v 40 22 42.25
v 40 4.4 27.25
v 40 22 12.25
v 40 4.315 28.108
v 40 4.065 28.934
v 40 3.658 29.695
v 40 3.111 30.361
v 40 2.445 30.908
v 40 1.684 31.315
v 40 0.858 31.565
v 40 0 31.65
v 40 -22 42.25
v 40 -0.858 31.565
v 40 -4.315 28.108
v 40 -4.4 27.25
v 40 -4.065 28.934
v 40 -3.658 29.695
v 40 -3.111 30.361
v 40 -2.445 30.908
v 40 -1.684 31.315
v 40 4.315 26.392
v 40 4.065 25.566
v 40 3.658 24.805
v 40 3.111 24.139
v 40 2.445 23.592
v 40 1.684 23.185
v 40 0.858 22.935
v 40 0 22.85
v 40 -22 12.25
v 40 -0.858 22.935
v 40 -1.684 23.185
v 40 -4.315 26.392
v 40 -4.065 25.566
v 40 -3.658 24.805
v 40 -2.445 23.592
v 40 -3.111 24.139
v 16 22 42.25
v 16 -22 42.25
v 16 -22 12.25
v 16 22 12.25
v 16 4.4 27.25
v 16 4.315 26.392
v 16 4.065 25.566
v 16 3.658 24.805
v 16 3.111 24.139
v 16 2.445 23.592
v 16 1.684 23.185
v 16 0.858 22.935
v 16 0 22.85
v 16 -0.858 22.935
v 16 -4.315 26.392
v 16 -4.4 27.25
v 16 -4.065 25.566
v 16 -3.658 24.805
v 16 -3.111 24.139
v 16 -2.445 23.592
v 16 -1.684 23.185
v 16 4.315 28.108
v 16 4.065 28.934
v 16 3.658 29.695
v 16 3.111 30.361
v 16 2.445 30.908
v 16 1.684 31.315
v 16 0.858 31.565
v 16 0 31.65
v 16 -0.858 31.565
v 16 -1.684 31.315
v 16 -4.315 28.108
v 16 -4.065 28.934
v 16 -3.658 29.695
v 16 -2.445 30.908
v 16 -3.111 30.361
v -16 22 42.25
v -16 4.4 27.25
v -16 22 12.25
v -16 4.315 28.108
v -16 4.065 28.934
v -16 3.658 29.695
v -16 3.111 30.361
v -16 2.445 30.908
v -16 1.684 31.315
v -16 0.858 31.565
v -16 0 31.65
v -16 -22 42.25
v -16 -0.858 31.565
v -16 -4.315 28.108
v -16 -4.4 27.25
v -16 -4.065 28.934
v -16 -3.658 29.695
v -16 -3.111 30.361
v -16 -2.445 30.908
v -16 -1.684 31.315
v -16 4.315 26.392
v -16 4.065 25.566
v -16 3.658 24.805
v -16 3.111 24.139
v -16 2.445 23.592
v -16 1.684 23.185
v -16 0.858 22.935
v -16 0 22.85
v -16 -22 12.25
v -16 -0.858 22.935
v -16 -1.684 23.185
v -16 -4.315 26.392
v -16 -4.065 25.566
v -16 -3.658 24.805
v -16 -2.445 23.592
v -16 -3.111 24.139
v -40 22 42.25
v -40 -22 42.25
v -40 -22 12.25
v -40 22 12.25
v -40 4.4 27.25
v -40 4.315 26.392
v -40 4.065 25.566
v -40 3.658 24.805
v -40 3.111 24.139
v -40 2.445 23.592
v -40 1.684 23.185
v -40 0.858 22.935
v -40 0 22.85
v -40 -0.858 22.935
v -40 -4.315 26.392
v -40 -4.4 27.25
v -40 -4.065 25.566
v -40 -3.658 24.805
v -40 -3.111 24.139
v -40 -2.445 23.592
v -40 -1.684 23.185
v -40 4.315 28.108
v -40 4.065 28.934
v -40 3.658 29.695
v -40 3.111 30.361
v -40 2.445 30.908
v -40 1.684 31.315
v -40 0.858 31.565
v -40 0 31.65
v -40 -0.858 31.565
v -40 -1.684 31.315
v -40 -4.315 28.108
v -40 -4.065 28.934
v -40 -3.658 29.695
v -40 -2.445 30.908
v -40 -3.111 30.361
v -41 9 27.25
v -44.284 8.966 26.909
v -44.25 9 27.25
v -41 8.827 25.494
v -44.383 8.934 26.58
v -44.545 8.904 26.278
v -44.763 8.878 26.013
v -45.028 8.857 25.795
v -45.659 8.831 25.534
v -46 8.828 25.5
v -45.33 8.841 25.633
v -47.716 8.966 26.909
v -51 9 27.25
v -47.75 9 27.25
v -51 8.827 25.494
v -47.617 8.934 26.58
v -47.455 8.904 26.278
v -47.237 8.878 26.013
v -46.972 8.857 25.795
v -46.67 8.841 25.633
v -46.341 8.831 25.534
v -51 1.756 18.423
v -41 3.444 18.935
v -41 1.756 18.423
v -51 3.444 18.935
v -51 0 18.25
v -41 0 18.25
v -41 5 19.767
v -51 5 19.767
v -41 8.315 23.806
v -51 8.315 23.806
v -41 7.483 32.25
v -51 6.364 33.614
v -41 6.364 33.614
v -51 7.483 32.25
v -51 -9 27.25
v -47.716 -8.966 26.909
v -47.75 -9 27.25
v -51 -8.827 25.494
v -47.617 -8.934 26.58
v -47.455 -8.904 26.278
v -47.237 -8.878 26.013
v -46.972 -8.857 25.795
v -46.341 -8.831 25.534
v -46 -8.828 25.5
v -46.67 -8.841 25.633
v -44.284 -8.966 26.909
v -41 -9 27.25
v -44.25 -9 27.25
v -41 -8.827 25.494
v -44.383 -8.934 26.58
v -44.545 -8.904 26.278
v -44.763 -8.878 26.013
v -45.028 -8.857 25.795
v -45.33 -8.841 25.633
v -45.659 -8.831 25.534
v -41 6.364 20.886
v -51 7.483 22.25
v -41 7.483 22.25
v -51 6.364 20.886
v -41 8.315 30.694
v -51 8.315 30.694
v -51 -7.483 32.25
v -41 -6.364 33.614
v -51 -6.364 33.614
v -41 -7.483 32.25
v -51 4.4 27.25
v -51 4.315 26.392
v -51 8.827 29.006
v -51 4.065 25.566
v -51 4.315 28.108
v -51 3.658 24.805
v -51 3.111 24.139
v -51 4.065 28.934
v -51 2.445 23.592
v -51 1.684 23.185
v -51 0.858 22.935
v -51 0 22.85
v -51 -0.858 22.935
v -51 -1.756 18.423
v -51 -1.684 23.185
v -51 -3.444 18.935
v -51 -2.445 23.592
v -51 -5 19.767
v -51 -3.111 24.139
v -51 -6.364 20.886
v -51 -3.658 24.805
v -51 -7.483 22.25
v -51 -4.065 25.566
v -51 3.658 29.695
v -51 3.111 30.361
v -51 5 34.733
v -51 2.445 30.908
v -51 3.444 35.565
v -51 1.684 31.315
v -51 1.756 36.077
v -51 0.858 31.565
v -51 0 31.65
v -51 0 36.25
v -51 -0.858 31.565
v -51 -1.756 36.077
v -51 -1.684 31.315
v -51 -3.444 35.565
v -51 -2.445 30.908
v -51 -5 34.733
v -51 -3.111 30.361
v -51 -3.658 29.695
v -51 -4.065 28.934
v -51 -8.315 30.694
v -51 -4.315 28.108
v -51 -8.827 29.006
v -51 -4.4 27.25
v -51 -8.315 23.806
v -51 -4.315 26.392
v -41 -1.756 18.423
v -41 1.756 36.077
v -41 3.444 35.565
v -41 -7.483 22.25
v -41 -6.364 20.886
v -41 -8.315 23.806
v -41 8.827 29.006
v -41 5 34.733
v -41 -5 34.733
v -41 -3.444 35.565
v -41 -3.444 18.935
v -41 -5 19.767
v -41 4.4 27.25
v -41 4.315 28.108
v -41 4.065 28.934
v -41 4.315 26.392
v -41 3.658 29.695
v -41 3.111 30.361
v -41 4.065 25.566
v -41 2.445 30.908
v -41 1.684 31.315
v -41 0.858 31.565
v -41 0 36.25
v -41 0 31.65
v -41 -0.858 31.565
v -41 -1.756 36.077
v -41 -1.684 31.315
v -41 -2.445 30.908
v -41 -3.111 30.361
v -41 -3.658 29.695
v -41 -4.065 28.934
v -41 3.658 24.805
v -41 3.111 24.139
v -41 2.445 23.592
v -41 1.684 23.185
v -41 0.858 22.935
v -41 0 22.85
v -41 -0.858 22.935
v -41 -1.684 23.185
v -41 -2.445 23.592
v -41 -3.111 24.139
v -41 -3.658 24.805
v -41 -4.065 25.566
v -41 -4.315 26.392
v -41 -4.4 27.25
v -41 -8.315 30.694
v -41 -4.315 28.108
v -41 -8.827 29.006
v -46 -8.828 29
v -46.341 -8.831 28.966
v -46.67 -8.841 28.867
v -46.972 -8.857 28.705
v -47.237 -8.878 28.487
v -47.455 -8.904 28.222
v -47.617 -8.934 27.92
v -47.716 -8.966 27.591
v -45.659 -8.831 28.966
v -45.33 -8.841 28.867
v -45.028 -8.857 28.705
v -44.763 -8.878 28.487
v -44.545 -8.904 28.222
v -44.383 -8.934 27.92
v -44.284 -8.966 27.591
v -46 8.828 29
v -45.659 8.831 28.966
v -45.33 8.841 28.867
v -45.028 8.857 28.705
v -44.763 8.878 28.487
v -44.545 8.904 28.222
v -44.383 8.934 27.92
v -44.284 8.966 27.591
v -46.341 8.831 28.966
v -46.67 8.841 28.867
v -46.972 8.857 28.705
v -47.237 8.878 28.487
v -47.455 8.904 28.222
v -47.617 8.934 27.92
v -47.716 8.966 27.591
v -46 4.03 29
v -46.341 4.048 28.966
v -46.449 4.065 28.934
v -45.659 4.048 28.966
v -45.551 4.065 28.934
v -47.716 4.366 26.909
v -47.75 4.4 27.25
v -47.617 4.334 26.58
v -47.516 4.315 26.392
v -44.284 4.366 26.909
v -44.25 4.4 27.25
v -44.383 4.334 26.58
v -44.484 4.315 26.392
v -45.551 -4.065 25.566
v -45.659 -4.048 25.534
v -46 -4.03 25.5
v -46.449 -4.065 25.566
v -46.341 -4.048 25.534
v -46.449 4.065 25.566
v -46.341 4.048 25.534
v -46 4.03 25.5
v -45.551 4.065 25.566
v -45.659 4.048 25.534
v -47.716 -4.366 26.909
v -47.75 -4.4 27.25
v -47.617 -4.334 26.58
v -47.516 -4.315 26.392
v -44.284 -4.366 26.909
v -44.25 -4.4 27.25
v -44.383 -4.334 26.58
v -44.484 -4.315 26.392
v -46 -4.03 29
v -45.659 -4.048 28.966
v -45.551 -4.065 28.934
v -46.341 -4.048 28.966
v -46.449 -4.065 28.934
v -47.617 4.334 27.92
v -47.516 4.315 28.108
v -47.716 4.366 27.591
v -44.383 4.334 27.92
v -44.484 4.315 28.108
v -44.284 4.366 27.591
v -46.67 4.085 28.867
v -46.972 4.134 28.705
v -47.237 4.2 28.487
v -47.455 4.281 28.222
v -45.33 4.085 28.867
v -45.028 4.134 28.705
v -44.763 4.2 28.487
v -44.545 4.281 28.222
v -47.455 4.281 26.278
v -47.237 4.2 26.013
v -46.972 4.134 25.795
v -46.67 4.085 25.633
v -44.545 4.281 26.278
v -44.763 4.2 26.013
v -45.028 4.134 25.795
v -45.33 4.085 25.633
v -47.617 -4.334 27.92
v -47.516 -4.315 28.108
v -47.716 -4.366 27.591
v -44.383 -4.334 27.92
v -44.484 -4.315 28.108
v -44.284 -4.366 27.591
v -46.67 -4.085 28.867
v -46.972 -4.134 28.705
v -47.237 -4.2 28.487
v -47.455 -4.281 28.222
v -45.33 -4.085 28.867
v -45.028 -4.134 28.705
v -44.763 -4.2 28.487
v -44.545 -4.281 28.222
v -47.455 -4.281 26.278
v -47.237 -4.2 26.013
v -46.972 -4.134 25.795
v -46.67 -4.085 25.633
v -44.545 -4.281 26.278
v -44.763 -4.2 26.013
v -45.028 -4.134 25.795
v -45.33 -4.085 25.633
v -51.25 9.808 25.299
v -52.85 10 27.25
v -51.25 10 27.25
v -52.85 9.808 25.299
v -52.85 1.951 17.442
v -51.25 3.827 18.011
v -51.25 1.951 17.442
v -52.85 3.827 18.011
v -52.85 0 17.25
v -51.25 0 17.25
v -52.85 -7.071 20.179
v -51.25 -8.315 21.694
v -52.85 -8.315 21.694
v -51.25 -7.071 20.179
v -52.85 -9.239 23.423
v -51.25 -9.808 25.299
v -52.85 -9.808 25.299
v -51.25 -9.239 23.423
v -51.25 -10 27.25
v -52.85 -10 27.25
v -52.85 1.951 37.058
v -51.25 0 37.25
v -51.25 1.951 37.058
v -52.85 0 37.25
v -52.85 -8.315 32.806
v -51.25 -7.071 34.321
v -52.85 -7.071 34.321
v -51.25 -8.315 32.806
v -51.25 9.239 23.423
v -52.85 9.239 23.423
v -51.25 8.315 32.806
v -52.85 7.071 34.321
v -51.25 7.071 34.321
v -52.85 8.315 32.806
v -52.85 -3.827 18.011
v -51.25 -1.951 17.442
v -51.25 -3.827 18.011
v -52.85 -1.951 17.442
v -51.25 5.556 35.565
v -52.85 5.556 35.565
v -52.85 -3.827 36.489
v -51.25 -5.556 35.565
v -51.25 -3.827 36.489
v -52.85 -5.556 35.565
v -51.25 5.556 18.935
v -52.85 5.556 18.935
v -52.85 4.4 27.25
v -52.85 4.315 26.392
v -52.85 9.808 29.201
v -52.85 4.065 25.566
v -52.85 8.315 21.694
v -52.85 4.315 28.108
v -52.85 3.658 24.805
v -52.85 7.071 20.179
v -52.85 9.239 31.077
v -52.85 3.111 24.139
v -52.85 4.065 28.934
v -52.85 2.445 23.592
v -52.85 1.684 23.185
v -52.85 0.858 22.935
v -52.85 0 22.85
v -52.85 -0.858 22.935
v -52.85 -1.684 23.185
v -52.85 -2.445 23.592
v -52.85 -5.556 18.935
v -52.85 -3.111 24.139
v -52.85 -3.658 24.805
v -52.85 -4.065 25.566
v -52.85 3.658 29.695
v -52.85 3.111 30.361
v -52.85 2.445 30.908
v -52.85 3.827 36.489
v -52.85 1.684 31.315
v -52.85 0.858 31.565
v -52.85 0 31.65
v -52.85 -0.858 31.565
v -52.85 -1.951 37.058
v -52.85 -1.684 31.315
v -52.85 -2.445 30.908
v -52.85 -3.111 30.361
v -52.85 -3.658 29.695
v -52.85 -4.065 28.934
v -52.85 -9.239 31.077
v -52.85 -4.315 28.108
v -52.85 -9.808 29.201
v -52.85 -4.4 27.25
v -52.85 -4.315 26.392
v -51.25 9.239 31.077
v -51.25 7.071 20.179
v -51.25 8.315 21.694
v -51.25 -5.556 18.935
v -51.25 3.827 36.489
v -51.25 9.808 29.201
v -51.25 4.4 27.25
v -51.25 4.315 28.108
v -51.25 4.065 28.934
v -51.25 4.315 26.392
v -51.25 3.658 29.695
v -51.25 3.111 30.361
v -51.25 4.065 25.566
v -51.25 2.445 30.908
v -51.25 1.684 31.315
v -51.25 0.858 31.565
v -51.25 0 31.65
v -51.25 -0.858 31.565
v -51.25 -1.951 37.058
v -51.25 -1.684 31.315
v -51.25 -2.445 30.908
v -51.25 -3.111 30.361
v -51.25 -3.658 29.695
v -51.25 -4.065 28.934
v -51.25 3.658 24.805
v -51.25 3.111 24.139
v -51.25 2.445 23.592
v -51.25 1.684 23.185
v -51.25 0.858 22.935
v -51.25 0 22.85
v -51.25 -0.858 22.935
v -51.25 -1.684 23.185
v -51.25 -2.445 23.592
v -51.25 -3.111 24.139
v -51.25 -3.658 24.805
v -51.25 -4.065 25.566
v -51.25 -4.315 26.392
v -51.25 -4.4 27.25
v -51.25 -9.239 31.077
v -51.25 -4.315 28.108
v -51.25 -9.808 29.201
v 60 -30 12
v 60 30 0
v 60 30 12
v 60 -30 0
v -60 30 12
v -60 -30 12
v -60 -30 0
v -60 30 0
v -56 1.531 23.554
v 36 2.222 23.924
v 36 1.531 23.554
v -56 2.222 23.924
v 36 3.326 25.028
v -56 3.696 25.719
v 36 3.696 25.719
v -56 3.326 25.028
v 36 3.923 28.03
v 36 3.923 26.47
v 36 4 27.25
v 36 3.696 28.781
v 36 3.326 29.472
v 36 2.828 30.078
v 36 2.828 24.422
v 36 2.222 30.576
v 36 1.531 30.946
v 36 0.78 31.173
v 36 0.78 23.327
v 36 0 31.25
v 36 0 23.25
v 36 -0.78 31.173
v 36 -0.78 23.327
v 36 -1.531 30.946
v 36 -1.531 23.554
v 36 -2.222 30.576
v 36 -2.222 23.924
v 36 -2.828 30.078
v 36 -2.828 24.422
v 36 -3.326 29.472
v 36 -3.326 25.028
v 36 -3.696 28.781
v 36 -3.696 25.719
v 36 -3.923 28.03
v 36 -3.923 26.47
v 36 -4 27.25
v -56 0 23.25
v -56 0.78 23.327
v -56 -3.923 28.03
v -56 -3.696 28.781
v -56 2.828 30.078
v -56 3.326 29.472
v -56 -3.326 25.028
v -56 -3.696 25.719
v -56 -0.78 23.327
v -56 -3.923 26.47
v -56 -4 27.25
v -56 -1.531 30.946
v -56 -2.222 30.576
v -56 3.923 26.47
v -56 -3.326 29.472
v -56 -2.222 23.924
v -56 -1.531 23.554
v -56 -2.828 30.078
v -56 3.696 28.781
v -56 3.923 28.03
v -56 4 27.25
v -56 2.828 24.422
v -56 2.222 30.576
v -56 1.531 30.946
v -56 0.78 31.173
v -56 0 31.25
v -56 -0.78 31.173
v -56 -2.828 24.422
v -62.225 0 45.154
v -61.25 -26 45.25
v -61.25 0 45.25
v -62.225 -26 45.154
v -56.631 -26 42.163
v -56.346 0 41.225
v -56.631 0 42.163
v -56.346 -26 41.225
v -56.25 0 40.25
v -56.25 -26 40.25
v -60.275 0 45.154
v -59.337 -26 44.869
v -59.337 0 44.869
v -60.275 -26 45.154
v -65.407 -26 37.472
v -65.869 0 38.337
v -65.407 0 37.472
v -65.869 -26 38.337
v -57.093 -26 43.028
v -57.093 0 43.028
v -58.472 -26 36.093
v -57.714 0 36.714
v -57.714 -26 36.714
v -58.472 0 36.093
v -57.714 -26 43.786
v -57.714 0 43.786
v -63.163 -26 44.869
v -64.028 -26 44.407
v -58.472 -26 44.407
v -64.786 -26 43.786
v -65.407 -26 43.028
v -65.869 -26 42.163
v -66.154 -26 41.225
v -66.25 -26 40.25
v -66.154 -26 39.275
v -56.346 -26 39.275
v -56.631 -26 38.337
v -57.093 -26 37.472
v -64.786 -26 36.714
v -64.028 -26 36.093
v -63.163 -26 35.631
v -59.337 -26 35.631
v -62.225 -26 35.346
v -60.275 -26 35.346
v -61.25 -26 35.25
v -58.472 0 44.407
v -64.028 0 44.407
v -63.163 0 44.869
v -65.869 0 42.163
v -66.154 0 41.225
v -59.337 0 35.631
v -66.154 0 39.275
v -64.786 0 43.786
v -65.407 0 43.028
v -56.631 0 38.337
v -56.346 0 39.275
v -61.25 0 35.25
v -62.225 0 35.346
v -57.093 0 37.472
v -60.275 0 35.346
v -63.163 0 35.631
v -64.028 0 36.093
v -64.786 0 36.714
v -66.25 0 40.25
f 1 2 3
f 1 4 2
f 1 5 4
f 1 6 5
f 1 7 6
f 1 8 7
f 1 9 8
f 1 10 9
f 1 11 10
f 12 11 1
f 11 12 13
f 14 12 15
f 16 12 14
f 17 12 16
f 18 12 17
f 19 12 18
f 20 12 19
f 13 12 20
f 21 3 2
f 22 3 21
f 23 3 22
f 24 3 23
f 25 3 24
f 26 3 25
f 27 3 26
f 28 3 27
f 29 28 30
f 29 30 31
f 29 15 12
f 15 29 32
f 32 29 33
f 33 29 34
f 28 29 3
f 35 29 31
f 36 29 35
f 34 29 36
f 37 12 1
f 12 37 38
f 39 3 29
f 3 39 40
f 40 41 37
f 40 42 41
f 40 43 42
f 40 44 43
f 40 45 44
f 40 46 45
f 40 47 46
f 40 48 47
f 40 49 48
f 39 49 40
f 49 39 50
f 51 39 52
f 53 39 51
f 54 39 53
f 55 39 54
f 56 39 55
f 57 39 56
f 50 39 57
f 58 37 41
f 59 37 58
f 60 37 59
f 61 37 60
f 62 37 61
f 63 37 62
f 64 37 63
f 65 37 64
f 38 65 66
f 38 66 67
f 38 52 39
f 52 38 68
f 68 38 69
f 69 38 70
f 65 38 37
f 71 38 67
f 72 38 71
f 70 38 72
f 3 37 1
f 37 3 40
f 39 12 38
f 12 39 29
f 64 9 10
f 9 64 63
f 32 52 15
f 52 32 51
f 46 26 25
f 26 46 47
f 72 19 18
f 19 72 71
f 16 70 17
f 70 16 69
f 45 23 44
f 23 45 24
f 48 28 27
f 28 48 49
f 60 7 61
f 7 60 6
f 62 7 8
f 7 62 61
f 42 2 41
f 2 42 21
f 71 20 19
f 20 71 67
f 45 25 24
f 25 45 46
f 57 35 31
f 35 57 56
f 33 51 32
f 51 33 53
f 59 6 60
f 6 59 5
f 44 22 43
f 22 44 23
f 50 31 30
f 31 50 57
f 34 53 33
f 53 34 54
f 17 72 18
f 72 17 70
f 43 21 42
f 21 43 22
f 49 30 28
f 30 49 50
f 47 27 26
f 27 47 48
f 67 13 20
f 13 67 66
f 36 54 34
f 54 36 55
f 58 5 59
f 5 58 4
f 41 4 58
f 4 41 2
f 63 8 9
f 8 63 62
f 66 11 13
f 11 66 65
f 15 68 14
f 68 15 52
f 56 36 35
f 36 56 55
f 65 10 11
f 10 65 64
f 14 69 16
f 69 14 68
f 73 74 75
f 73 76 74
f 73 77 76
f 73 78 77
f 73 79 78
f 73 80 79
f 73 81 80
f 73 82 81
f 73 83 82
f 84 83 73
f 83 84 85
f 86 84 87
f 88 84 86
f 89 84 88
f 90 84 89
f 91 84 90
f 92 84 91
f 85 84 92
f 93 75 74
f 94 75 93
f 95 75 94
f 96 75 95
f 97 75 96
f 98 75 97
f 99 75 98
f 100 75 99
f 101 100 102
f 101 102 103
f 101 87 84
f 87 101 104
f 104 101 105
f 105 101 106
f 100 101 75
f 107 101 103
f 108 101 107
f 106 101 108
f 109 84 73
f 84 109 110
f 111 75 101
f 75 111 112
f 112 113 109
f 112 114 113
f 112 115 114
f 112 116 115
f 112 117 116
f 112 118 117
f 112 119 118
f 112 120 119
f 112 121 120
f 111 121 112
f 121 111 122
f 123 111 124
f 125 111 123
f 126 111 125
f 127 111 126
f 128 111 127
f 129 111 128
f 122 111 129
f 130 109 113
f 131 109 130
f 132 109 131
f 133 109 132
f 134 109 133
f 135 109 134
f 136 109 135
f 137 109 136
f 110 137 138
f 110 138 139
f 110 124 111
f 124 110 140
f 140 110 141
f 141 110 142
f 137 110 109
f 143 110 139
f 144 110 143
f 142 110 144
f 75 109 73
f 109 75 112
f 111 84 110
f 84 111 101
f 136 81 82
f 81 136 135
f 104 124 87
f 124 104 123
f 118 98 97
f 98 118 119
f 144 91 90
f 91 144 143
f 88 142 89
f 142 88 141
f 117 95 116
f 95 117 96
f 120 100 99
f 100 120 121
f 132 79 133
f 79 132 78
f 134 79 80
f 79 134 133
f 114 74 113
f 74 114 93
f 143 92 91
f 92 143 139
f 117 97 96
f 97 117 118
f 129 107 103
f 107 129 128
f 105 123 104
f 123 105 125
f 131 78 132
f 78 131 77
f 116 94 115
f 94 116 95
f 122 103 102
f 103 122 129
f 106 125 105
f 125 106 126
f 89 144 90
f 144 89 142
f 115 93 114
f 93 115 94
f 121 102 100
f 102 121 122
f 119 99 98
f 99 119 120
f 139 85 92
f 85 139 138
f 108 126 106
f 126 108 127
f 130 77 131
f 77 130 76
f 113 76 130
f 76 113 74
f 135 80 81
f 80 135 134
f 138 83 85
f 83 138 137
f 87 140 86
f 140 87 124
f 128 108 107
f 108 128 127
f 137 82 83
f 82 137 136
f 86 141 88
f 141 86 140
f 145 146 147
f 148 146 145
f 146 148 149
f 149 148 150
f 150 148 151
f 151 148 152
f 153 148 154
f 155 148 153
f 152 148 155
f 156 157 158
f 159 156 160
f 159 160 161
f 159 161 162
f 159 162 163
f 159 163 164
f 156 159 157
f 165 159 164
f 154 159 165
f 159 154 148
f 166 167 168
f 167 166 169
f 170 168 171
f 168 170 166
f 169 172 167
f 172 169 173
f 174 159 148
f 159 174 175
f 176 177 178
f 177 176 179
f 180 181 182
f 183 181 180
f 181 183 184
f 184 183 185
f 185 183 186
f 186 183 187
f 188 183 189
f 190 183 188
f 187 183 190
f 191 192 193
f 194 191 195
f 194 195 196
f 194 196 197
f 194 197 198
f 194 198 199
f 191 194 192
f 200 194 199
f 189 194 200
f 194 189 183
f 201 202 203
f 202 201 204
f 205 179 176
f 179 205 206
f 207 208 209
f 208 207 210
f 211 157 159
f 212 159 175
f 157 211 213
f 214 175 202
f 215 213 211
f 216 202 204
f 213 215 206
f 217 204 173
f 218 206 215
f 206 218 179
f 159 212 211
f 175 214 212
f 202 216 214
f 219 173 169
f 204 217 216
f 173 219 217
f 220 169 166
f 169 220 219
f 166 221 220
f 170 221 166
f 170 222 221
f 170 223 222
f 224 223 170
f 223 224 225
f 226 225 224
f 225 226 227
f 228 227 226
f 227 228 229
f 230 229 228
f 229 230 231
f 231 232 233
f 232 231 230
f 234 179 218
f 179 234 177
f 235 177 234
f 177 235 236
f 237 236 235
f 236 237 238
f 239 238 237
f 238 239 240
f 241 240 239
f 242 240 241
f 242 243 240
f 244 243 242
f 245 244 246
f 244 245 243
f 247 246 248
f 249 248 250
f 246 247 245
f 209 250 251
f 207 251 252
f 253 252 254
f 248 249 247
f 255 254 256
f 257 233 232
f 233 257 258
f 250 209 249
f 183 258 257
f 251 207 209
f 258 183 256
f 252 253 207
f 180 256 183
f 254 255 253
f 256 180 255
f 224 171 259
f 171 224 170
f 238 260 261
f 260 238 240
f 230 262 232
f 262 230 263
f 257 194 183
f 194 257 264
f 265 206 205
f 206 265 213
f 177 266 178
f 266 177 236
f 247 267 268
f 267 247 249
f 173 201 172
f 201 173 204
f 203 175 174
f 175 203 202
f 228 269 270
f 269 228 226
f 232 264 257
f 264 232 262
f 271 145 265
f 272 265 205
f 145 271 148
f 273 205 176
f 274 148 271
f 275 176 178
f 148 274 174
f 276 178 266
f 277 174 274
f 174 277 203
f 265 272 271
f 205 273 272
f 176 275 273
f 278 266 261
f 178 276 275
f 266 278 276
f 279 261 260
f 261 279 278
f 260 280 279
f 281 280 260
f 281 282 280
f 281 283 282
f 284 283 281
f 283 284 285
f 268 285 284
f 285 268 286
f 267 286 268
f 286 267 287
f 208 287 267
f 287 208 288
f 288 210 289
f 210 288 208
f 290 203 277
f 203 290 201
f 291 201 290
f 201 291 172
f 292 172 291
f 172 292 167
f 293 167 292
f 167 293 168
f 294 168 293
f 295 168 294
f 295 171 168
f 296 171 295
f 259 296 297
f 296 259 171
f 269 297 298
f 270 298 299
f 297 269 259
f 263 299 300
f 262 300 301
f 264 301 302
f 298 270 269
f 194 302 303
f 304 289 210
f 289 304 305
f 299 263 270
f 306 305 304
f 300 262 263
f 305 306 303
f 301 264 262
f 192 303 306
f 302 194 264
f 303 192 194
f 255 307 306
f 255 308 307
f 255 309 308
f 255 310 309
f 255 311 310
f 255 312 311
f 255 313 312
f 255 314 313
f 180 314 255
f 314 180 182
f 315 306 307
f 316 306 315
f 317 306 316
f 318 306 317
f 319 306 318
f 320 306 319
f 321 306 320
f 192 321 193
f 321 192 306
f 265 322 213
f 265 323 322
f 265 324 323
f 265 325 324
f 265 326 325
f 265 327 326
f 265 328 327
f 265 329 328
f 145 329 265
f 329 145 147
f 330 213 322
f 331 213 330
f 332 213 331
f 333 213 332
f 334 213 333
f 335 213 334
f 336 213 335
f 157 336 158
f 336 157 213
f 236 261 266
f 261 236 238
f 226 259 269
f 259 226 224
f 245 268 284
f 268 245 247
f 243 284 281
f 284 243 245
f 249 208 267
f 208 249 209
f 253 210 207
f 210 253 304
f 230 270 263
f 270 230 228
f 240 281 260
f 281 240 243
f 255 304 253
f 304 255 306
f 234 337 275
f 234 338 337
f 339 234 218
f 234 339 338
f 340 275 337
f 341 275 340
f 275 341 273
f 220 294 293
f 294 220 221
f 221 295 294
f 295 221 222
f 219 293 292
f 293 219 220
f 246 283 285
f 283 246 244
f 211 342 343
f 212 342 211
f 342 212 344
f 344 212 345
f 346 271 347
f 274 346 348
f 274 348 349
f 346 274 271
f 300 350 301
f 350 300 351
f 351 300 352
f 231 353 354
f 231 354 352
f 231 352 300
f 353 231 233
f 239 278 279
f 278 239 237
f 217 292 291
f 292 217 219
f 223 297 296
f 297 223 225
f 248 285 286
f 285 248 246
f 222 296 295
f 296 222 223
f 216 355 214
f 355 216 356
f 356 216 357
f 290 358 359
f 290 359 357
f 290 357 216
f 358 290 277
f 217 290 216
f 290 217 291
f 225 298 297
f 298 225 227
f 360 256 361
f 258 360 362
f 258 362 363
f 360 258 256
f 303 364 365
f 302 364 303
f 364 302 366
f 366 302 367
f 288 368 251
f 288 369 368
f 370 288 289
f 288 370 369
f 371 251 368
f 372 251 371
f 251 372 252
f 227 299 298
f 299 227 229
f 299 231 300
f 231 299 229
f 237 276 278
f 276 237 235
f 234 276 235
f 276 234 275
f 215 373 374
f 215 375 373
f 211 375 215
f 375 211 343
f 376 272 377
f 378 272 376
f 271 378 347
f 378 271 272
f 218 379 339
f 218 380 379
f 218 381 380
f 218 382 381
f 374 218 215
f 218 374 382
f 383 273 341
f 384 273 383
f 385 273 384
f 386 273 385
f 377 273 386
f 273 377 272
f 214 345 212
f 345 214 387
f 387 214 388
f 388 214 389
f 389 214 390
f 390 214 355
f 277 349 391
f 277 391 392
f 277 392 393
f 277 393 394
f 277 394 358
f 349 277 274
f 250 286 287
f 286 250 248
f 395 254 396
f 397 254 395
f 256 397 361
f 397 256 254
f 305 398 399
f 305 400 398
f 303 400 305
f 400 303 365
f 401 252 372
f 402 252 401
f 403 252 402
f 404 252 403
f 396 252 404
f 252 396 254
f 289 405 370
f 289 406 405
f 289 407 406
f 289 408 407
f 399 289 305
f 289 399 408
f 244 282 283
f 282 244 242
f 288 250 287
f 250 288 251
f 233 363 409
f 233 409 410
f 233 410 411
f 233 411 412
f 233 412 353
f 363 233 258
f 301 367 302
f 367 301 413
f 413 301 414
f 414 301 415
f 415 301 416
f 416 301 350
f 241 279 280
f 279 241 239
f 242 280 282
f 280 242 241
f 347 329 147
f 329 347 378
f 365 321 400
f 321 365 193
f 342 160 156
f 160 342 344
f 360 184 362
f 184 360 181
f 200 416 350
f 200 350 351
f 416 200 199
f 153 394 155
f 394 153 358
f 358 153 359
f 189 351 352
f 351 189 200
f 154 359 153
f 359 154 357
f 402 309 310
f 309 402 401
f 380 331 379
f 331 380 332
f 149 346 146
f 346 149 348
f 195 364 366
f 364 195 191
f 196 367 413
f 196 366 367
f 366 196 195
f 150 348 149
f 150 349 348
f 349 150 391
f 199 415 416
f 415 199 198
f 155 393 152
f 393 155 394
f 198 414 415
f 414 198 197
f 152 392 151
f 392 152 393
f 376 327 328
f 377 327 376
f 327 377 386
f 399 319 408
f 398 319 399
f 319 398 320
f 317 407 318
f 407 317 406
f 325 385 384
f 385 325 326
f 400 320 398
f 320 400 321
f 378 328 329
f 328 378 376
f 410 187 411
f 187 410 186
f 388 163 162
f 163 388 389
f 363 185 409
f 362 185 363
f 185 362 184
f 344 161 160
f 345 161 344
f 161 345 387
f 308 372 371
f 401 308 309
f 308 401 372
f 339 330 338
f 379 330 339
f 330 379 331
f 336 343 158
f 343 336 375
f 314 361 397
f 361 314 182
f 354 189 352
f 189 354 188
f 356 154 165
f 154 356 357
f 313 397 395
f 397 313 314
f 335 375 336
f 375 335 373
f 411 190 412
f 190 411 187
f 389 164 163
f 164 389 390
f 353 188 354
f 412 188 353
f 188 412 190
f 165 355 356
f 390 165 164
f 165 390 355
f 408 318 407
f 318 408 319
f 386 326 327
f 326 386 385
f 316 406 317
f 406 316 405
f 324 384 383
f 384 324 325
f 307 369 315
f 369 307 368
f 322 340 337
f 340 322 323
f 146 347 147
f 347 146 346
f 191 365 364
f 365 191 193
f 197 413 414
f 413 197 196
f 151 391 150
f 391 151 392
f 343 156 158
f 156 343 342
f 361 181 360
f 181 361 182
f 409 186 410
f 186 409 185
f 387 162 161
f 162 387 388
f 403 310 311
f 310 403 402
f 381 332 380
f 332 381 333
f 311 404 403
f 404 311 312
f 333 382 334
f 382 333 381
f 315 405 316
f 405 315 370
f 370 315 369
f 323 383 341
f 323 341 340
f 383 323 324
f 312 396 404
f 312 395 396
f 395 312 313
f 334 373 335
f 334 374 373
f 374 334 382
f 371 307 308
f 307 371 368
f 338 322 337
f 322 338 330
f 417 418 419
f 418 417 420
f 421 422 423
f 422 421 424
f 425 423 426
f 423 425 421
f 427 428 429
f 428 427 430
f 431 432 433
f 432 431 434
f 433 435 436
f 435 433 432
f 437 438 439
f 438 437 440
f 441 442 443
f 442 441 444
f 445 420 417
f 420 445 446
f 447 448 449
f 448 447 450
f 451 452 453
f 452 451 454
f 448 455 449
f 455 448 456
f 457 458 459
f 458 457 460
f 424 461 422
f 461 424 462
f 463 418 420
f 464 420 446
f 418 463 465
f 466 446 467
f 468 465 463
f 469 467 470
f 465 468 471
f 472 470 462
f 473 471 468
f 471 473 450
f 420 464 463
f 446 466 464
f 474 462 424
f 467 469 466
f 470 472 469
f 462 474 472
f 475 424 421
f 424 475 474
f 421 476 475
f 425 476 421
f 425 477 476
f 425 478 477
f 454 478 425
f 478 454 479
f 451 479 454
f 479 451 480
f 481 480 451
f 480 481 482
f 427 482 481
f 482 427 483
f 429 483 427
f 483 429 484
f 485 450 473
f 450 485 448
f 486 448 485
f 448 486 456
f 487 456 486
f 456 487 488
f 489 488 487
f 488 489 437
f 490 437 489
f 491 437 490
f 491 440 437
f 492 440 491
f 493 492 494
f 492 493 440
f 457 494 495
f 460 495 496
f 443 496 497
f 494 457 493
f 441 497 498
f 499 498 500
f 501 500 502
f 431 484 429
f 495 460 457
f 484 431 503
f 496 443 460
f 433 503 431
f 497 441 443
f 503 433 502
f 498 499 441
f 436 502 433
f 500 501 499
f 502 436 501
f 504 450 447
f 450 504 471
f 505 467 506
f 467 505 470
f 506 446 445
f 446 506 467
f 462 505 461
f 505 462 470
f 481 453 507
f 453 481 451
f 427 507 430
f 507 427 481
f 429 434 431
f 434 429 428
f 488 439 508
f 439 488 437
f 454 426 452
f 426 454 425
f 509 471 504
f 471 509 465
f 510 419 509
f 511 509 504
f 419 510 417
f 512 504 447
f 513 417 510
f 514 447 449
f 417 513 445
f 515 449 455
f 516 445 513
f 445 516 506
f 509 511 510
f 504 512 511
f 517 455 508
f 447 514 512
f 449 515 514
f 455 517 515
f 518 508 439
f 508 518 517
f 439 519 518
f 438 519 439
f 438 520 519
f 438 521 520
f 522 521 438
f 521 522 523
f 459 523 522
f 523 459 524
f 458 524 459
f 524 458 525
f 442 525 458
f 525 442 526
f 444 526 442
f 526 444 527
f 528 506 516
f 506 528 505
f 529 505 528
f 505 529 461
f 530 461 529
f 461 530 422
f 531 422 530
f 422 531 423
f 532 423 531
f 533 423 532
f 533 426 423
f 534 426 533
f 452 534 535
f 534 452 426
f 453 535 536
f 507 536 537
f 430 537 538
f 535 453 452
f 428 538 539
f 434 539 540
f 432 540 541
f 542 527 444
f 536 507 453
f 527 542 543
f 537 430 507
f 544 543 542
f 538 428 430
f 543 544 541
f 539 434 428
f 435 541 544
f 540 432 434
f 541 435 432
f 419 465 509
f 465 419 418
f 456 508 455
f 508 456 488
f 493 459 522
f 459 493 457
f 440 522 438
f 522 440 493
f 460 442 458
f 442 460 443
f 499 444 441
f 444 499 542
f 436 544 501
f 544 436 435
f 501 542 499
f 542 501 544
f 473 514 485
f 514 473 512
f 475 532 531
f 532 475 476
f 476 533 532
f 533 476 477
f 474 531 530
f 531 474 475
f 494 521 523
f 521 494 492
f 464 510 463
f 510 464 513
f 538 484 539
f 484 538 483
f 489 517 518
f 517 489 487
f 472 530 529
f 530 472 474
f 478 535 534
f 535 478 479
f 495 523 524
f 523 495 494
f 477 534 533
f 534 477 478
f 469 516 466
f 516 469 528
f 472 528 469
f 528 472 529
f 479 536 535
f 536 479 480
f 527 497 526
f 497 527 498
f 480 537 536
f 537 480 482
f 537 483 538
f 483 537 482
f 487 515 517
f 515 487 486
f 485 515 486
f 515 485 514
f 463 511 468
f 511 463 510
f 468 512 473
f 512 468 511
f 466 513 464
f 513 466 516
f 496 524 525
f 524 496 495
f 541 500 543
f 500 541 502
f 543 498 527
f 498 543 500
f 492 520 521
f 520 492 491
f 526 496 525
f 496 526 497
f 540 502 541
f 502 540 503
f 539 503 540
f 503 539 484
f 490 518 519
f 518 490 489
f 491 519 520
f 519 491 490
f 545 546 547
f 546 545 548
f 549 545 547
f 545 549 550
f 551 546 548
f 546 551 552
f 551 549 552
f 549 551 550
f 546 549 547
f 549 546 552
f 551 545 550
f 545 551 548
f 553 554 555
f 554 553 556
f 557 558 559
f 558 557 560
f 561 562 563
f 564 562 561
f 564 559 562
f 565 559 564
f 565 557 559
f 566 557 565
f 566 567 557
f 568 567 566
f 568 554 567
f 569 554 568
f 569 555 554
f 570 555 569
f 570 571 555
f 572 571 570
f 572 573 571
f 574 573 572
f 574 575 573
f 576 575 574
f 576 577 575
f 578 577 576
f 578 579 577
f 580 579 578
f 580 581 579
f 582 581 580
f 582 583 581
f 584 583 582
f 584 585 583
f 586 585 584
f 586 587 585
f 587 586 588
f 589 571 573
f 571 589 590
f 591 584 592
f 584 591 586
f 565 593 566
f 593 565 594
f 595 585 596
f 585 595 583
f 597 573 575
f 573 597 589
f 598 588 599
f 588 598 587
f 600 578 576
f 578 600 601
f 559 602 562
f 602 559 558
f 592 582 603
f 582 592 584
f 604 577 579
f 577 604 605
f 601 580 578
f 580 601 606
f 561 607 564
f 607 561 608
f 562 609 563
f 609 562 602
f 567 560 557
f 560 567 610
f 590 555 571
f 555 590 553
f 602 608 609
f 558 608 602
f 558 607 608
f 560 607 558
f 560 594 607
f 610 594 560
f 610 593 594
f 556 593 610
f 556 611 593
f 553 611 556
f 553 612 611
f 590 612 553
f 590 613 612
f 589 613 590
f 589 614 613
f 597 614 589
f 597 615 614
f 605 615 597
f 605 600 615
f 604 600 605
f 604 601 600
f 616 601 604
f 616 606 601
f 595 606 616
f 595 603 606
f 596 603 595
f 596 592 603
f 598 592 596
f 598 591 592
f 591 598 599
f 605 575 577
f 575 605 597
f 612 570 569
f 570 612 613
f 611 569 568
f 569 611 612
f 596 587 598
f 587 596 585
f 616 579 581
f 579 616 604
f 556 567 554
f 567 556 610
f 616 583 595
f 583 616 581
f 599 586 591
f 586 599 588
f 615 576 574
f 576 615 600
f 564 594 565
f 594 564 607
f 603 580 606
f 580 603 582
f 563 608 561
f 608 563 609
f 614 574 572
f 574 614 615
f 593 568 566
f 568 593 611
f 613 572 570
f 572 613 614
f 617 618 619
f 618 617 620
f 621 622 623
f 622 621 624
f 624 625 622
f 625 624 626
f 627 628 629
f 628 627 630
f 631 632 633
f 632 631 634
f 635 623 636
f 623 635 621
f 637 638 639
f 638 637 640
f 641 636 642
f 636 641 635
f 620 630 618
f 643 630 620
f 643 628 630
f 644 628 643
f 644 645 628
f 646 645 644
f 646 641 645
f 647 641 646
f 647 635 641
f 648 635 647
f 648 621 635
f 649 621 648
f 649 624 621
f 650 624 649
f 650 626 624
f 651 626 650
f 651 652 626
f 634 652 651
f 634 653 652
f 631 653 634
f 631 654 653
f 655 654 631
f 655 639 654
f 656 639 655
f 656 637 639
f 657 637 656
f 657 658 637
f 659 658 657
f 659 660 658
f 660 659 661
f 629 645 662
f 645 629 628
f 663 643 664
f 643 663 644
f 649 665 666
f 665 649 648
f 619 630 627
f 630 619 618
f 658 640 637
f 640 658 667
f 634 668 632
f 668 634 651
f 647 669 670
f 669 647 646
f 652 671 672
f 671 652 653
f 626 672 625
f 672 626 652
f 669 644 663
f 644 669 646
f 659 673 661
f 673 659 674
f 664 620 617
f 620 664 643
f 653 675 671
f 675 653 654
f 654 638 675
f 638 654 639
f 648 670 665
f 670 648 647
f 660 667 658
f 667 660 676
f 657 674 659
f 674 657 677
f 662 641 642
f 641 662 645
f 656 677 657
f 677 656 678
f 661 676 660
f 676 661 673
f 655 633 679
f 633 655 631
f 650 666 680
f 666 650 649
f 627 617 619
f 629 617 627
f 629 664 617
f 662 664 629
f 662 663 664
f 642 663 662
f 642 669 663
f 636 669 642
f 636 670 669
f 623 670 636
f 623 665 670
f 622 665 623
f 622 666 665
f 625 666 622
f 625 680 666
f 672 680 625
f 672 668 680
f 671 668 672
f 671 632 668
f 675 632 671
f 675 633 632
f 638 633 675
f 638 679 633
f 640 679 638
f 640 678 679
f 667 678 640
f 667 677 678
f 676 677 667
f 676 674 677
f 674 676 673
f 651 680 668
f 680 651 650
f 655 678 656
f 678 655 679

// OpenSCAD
$fn = 32;

// ------------------------------------------------------------------------
// Machine vise: screw d8, jaws 24 x 30 mm
// Every part is its own module, assembly() places every instance.
// ------------------------------------------------------------------------

// --- part 1 ---
module vise_bed() {
  difference() {
    translate([-60, -30, 0]) cube([120, 60, 12]);
  }
}

// --- part 2 ---
module vise_jaw() {
  difference() {
    translate([-12, -22, 0]) cube([24, 44, 30]);
    translate([0, 0, 15]) rotate([0, 90, 0]) cylinder(h = 26, d = 8.8, center = true);
  }
}

// --- part 3 ---
module vise_screw() {
  translate([0, 0, -46]) cylinder(h = 92, d = 8);
}

// --- part 4 ---
module screw_collar() {
  difference() {
    cylinder(h = 10, d = 18);
    translate([0, 0, -1]) cylinder(h = 12, d = 8.8);
    translate([0, 0, 5]) rotate([90, 0, 0]) cylinder(h = 20, d = 3.5, center = true);
  }
}

// --- part 5 ---
module screw_washer() {
  difference() {
      translate([0, 0, 0]) cylinder(h = 1.6, d = 20);
      translate([0, 0, -1]) cylinder(h = 3.6, d = 8.8);
    }
}

// --- part 6 ---
module vise_handle() {
  cylinder(h = 26, d = 10);
}

// --- assembly ---
module assembly() {
  color([0.80, 0.24, 0.20]) translate([0, 0, 0]) rotate([0, 0, 0]) vise_bed();
  color([0.20, 0.45, 0.75]) translate([28, 0, 12.25]) rotate([0, 0, 0]) vise_jaw();
  color([0.25, 0.62, 0.32]) translate([-28, 0, 12.25]) rotate([0, 0, 0]) vise_jaw();
  color([0.92, 0.70, 0.18]) translate([-10, 0, 27.25]) rotate([0, 90, 0]) vise_screw();
  color([0.58, 0.35, 0.70]) translate([-51, 0, 27.25]) rotate([0, 90, 0]) screw_collar();
  color([0.16, 0.66, 0.66]) translate([-52.85, 0, 27.25]) rotate([0, 90, 0]) screw_washer();
  color([0.85, 0.48, 0.18]) translate([-61.25, 0, 40.25]) rotate([90, 0, 0]) vise_handle();
}

assembly();
